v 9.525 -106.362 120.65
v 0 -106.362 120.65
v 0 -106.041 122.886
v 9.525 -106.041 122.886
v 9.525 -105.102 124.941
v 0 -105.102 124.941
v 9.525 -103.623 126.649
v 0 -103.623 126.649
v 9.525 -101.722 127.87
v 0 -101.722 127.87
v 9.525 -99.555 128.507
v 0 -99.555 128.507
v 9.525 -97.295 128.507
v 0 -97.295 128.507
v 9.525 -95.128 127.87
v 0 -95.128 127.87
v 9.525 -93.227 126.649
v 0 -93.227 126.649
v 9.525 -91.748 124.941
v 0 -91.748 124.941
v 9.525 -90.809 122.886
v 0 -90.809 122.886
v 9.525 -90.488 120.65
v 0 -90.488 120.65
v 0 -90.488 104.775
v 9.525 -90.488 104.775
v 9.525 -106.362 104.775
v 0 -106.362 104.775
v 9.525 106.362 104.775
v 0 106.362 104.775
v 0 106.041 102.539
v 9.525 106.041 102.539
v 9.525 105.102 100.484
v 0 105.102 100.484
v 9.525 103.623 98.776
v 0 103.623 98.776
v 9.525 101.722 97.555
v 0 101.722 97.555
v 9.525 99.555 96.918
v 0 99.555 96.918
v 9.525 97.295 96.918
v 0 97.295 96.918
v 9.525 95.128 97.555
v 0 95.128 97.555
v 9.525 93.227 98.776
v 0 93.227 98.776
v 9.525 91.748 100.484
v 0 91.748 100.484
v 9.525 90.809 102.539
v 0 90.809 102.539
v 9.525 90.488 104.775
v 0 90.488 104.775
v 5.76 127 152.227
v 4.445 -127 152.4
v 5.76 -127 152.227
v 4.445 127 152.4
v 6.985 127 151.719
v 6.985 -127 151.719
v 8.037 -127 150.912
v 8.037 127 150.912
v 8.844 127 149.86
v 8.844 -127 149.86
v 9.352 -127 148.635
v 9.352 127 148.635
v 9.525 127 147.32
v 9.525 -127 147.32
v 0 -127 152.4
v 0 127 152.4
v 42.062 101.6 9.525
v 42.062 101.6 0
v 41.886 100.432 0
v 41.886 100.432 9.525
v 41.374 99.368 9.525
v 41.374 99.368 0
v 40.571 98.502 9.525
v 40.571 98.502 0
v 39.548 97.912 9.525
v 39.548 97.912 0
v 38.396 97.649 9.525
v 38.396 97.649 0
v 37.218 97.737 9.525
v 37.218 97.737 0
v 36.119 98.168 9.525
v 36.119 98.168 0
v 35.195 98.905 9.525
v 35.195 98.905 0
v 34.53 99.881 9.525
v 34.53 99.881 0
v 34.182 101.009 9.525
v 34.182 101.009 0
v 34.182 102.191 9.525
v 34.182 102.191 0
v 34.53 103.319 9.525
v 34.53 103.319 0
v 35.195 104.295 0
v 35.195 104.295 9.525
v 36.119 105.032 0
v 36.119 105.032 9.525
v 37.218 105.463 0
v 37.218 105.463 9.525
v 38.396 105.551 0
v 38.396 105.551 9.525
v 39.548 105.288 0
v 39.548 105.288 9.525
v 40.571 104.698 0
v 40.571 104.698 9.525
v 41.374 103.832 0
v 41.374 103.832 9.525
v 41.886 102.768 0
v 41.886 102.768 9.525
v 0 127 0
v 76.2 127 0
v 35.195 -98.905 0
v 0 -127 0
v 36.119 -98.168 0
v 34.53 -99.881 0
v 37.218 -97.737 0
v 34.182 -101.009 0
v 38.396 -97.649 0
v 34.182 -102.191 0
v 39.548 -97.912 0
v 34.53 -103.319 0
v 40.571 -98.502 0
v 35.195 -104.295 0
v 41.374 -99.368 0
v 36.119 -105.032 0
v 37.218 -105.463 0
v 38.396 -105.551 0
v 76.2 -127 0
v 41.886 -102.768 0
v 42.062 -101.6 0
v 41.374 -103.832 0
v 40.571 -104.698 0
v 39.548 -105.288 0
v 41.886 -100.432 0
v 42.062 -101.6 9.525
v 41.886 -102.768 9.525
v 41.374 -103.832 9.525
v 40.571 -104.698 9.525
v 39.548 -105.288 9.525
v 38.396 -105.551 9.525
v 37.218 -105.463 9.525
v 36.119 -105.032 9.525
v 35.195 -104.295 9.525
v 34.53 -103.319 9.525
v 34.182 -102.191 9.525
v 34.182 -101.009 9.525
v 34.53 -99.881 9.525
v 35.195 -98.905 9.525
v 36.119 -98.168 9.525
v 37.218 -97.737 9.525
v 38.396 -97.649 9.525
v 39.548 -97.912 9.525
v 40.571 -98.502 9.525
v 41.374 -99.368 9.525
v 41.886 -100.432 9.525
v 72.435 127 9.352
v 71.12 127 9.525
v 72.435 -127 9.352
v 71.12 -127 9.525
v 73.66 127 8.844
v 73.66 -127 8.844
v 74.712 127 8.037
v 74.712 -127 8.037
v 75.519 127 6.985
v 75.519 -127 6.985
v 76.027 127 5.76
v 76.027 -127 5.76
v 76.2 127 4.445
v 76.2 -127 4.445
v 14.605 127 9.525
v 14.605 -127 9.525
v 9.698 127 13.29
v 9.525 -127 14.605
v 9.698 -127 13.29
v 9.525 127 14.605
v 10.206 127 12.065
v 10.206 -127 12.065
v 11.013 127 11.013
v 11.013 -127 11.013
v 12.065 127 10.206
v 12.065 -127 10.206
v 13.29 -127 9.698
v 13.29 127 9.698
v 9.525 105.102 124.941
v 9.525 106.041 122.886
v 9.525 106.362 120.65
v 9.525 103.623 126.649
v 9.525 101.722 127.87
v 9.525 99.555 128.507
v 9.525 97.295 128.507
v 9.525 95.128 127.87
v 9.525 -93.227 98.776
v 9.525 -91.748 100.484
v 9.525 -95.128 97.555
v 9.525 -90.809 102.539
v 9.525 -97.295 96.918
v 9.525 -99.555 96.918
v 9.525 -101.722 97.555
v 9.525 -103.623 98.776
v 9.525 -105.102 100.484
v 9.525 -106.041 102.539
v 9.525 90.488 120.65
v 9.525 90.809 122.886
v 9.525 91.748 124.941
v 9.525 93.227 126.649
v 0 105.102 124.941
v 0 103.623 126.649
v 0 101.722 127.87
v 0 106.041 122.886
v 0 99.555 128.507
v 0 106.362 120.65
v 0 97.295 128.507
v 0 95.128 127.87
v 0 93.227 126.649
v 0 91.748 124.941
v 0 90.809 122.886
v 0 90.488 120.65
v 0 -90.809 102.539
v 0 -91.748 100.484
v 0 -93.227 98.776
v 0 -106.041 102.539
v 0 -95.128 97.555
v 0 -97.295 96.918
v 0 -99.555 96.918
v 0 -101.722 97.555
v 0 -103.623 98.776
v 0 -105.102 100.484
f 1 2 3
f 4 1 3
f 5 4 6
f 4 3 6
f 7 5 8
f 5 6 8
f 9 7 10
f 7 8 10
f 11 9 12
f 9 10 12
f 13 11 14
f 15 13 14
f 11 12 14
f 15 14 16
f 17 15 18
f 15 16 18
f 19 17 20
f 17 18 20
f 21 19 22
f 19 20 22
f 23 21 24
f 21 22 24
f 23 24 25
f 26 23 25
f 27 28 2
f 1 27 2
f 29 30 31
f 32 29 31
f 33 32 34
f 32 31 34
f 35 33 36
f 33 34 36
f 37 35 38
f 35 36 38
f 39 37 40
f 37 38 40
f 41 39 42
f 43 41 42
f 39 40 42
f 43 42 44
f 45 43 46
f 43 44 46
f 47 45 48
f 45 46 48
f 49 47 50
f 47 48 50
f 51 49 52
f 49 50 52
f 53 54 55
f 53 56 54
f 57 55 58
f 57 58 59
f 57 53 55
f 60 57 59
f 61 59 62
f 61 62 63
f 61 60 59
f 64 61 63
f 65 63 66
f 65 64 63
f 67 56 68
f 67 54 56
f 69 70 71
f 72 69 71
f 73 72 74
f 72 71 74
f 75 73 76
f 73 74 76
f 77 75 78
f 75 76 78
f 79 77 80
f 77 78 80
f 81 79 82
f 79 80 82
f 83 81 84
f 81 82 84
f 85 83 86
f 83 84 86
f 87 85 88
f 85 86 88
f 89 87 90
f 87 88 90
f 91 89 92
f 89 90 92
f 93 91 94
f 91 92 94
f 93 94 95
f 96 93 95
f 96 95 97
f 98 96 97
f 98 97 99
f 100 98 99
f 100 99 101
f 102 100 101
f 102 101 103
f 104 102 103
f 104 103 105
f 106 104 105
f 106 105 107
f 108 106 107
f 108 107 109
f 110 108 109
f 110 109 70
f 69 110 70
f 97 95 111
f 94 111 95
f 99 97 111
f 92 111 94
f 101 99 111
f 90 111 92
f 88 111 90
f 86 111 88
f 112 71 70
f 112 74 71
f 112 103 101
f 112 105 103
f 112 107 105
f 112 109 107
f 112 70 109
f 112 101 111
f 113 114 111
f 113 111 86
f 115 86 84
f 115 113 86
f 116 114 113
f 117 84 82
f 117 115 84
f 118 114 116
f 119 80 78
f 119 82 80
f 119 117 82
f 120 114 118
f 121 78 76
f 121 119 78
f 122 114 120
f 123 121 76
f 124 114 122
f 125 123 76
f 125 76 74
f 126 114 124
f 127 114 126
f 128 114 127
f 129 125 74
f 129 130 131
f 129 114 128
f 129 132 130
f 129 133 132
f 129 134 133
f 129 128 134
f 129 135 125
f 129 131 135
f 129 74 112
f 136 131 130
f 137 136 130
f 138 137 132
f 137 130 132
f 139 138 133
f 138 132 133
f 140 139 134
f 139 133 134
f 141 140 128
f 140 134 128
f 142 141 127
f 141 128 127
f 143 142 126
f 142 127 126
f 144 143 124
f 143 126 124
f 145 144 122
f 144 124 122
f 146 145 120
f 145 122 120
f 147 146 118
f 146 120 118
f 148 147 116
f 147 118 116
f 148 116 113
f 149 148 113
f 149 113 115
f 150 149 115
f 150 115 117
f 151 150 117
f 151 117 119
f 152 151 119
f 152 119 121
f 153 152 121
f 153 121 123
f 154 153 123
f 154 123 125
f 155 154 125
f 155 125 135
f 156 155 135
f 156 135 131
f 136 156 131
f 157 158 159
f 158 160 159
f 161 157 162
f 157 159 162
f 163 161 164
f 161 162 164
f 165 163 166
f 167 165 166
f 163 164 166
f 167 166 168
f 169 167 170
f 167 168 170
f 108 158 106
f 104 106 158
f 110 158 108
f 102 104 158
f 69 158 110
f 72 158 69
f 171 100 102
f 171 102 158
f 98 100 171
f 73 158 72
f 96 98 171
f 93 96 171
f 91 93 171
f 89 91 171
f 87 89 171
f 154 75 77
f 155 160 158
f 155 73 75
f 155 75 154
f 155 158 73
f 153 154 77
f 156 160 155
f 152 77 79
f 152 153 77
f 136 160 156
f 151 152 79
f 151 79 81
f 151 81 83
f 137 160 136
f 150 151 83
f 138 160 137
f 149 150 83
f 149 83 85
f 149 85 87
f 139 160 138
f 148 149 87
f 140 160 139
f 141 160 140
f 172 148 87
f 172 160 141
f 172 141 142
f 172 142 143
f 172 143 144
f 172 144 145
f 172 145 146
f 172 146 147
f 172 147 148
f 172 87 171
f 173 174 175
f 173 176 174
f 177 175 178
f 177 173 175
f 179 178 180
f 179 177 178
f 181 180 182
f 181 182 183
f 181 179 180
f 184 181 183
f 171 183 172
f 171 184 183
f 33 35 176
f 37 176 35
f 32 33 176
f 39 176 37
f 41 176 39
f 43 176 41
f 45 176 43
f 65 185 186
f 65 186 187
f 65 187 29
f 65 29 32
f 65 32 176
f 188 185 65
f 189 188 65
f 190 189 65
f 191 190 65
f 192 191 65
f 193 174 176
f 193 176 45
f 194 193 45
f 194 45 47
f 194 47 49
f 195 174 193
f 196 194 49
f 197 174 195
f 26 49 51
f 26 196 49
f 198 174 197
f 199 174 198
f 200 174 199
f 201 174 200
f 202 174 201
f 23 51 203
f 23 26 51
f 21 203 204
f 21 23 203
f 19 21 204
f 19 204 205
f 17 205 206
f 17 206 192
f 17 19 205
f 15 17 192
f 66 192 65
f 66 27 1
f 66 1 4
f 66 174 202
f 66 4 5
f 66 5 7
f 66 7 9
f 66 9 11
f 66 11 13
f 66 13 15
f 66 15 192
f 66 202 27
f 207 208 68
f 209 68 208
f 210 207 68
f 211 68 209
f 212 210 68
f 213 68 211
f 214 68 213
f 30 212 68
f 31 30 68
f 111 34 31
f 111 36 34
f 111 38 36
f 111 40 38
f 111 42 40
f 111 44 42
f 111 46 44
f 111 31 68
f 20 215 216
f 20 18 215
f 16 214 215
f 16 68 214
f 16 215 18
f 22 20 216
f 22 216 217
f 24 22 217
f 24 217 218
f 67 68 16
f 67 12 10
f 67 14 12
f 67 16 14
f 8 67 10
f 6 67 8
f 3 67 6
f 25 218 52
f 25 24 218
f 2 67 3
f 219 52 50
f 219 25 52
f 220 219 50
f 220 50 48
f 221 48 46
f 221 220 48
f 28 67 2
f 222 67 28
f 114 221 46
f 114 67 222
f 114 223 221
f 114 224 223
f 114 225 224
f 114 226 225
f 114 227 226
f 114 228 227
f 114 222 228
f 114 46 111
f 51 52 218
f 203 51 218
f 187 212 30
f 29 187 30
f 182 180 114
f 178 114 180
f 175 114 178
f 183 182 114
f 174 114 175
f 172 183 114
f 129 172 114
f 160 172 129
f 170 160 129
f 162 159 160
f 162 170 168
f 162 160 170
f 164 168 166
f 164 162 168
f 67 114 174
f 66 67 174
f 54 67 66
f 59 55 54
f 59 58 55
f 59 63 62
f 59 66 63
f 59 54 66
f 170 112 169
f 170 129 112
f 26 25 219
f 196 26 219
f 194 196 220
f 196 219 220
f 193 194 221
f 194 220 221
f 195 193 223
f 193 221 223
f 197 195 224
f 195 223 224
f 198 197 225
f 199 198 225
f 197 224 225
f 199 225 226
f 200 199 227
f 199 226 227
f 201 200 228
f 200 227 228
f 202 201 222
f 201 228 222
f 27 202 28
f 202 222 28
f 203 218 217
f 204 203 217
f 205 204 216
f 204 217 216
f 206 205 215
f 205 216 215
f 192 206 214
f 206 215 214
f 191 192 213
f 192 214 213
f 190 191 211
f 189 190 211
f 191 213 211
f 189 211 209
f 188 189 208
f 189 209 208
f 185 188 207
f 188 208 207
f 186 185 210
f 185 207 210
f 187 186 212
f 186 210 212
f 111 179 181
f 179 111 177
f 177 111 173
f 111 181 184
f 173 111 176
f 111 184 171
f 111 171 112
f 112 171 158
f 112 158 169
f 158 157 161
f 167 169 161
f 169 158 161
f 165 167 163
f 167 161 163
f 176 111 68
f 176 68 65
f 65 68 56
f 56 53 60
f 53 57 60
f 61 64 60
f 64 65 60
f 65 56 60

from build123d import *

# Parameters (mm, degrees)
F1_DEPTH = 127
F2_R     = 5.08
F4_DEPTH = 25.4
F5_R     = 3.9624
F6_DEPTH = 25.4


with BuildPart() as f1:
    # F0 (on Front) → F1 (new body, symmetric)
    with BuildSketch(Plane.XZ):
        Polygon((0, 152.4), (0, 0), (76.2, 0), (76.2, 9.525), (9.525, 9.525), (9.525, 152.4), align=None)
    extrude(amount=F1_DEPTH, both=True)

    # F2
    f2_edges = [f1.edges().sort_by_distance(p)[0] for p in [
        (9.525, 0, 152.4),
        (9.525, 0, 9.525),
        (76.2, 0, 9.525),
    ]]
    fillet(f2_edges, radius=F2_R)

    # F3 (on face) → F4 (cut)
    with BuildSketch(Plane(origin=(0, 0, 0), x_dir=(0, -1, 0), z_dir=(-1, 0, 0))):
        with BuildLine():
            Line((-90.4875, 104.775), (-90.4875, 120.65))
            ThreePointArc((-90.4875, 120.65), (-98.425, 128.5875), (-106.3625, 120.65))
            Line((-106.3625, 120.65), (-106.3625, 104.775))
            ThreePointArc((-106.3625, 104.775), (-98.425, 96.8375), (-90.4875, 104.775))
        make_face()
        with BuildLine():
            ThreePointArc((106.3625, 120.65), (98.425, 128.5875), (90.4875, 120.65))
            Line((90.4875, 120.65), (90.4875, 104.775))
            ThreePointArc((90.4875, 104.775), (98.425, 96.8375), (106.3625, 104.775))
            Line((106.3625, 104.775), (106.3625, 120.65))
        make_face()
    extrude(amount=-F4_DEPTH, mode=Mode.SUBTRACT)

    # F5 (on face) → F6 (cut)
    with BuildSketch(Plane(origin=(0, 0, 0), x_dir=(1, 0, 0), z_dir=(0, 0, -1))):
        with Locations((38.1, -101.6)):
            Circle(F5_R)
        with Locations((38.1, 101.6)):
            Circle(F5_R)
    extrude(amount=-F6_DEPTH, mode=Mode.SUBTRACT)


solid = f1.part
